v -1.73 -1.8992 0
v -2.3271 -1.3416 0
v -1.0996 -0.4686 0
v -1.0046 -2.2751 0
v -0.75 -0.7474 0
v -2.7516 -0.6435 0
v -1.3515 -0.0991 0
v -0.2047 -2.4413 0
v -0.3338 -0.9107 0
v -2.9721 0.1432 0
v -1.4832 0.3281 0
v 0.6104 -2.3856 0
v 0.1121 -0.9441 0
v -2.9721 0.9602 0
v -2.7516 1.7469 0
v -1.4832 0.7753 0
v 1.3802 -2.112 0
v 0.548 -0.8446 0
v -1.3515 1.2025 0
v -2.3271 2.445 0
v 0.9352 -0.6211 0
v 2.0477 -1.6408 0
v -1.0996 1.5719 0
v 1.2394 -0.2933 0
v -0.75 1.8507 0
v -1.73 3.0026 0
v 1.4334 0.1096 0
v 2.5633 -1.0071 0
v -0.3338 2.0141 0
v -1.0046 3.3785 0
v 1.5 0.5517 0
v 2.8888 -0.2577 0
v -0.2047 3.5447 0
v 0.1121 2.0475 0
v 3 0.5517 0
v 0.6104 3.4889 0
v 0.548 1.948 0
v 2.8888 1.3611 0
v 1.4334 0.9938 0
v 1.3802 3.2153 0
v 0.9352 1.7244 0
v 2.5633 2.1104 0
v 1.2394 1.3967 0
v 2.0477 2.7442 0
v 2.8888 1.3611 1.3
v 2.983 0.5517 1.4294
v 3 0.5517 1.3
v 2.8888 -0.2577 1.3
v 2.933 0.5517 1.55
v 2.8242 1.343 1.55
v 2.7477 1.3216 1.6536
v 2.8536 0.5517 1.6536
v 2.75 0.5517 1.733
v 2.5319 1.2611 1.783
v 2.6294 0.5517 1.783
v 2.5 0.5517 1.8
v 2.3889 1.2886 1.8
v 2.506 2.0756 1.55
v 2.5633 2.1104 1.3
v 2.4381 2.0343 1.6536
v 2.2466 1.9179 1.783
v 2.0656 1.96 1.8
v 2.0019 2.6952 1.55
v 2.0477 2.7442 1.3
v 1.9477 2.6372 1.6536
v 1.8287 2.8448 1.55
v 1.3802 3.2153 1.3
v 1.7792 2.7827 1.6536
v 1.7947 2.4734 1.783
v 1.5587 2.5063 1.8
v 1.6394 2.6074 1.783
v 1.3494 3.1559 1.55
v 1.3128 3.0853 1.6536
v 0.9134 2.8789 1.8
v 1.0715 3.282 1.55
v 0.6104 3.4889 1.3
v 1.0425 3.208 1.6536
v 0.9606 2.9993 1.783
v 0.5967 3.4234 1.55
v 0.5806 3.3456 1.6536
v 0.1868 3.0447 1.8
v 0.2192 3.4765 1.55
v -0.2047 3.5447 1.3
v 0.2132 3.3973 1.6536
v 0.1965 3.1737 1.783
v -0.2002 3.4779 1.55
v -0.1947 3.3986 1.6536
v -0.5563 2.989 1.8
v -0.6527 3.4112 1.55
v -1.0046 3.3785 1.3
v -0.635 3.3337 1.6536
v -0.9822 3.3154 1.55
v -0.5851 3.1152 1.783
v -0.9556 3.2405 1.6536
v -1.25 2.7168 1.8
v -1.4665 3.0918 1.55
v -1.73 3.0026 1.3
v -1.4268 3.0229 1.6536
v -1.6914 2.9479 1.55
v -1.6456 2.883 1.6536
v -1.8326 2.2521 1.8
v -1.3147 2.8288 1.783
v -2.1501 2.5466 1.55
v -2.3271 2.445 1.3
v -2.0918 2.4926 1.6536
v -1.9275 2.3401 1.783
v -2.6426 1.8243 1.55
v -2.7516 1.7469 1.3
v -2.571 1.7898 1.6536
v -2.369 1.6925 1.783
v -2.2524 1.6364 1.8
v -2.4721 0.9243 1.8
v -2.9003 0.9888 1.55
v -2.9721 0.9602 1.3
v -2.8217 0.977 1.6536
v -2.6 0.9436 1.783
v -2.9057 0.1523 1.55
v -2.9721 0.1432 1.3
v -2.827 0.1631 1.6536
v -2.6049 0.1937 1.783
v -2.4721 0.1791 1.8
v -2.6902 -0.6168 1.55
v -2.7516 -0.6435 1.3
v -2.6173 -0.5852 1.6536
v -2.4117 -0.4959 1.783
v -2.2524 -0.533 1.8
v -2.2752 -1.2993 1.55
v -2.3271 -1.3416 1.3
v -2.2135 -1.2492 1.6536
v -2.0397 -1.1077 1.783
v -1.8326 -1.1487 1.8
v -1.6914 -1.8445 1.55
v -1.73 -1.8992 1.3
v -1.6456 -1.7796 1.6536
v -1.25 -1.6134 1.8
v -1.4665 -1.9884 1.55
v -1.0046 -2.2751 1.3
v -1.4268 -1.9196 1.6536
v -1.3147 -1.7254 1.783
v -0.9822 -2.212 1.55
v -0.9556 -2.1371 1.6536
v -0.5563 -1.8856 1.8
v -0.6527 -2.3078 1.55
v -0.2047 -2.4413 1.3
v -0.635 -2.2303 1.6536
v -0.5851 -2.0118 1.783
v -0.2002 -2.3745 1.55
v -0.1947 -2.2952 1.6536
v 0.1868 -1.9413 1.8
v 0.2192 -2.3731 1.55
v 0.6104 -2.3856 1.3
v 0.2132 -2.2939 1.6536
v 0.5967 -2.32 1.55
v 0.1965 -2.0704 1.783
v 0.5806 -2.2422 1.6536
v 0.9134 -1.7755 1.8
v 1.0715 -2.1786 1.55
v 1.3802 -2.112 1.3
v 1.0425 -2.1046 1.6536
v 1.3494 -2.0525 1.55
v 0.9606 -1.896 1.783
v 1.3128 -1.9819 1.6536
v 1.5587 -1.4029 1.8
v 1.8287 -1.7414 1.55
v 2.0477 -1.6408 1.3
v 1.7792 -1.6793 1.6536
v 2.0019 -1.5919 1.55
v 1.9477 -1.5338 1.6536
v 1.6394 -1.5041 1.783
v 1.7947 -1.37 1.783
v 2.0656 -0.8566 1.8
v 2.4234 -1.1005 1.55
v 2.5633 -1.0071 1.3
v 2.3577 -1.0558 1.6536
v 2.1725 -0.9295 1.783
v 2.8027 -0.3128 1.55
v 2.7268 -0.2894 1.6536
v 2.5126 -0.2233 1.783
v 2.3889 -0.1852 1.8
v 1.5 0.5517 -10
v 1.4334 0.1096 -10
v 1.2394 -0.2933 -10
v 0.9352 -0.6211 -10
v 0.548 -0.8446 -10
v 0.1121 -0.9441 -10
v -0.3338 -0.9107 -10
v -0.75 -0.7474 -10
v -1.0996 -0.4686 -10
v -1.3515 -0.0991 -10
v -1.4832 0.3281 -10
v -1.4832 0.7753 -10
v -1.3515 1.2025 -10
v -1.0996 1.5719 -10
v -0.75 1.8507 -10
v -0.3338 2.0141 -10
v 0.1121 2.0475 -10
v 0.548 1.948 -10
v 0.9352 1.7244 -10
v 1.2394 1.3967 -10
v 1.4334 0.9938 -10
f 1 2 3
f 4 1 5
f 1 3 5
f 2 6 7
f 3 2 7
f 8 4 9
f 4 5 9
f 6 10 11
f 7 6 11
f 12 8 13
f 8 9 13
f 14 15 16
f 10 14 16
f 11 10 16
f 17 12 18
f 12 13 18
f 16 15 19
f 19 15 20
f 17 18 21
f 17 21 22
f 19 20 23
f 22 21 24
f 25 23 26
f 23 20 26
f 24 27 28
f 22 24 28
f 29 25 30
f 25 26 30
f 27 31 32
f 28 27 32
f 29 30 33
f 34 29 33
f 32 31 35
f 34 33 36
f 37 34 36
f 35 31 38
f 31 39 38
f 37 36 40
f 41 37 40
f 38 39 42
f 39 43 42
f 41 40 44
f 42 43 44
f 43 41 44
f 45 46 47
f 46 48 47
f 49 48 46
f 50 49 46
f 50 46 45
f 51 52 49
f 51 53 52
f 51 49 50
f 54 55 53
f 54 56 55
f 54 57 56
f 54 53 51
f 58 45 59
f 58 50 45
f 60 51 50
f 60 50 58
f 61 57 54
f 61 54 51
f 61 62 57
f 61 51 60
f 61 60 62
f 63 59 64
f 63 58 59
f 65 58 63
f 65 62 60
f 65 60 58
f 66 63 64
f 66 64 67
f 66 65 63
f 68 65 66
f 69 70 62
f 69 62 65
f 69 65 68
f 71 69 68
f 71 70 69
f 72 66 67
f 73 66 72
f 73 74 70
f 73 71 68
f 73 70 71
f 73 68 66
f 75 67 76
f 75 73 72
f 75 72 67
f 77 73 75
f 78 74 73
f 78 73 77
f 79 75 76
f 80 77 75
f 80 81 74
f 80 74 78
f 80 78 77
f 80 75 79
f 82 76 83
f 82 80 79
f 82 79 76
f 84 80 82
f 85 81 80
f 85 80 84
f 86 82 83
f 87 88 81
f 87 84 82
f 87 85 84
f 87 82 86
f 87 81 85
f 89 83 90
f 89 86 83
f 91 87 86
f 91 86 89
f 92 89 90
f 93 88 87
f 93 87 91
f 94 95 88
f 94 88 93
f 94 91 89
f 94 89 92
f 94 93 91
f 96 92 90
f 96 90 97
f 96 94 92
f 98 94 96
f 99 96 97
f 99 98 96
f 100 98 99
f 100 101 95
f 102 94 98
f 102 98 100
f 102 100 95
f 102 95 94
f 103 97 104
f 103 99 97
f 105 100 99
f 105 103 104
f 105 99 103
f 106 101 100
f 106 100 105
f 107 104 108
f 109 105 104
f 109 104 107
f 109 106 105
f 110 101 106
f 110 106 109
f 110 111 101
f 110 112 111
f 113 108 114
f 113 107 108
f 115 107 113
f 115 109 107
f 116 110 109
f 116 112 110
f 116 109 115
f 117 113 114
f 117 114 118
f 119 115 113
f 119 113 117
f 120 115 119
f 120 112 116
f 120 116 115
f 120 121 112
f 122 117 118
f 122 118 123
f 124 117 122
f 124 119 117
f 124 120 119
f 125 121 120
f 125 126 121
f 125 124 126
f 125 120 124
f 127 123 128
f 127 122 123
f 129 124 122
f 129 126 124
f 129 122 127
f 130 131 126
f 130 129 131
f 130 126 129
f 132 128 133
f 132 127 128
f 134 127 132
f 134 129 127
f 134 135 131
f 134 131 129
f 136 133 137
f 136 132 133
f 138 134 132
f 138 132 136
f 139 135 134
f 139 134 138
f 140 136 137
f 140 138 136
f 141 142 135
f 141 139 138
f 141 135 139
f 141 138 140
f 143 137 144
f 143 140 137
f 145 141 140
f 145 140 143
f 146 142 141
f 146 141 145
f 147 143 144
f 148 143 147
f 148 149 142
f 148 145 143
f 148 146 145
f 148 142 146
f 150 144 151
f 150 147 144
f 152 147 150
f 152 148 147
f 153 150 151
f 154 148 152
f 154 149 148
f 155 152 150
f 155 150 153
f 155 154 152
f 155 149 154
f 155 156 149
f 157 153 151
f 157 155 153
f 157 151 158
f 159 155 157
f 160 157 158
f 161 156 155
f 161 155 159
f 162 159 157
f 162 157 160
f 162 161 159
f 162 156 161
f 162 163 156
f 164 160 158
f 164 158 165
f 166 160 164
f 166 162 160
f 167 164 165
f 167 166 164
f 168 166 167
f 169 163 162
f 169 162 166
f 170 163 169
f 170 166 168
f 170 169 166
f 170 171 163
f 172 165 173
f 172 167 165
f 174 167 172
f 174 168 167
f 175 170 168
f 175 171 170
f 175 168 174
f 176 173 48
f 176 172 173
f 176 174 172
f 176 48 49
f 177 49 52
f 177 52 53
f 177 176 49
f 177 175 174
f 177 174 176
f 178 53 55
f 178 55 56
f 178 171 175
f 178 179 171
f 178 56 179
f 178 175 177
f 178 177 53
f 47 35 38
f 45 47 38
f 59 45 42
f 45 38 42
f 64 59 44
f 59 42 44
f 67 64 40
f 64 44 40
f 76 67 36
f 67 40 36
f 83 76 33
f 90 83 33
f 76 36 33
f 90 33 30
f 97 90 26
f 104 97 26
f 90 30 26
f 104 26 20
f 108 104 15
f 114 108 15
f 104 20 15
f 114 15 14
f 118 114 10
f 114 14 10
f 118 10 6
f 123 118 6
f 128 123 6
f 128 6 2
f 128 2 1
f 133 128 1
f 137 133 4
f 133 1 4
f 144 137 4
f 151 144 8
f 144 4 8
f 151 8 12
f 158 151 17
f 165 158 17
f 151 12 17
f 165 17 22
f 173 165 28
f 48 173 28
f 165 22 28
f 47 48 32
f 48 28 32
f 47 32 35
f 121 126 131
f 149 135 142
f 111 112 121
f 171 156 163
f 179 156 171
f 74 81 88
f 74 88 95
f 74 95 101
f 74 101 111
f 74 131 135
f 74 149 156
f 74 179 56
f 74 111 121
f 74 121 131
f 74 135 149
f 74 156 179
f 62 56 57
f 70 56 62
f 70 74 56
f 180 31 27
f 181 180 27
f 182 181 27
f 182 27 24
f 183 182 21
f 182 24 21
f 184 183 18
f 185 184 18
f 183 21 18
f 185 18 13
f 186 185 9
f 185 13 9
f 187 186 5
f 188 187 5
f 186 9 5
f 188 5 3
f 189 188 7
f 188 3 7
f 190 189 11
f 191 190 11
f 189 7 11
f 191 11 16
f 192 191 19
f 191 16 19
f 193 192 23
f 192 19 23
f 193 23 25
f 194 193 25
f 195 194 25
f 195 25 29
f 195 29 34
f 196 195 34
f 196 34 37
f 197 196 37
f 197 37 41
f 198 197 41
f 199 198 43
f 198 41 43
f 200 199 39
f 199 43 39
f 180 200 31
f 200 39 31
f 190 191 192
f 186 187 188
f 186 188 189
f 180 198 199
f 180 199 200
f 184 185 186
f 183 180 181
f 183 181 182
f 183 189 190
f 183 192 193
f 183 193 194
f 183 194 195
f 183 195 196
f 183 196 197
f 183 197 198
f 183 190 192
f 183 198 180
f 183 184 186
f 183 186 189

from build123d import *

# Parameters (mm, degrees)
F0_R     = 3
F1_DEPTH = 1.8
F2_R     = 1.5
F3_DEPTH = 10
F4_R     = 0.5


with BuildPart() as f1:
    # F0 (on Top) → F1 (new body)
    with BuildSketch(Plane.XY):
        with Locations((0, 0.551688)):
            Circle(F0_R)
    extrude(amount=F1_DEPTH)

    # F2 (on face) → F3 (join)
    with BuildSketch(Plane(origin=(0, 0, 0), x_dir=(1, 0, 0), z_dir=(0, 0, -1))):
        with Locations((0, -0.551688)):
            Circle(F2_R)
    extrude(amount=F3_DEPTH)

    # F4
    f4_edges = [f1.edges().sort_by_distance(p)[0] for p in [
        (-3, 0.551688, 1.8),
    ]]
    fillet(f4_edges, radius=F4_R)


solid = f1.part
